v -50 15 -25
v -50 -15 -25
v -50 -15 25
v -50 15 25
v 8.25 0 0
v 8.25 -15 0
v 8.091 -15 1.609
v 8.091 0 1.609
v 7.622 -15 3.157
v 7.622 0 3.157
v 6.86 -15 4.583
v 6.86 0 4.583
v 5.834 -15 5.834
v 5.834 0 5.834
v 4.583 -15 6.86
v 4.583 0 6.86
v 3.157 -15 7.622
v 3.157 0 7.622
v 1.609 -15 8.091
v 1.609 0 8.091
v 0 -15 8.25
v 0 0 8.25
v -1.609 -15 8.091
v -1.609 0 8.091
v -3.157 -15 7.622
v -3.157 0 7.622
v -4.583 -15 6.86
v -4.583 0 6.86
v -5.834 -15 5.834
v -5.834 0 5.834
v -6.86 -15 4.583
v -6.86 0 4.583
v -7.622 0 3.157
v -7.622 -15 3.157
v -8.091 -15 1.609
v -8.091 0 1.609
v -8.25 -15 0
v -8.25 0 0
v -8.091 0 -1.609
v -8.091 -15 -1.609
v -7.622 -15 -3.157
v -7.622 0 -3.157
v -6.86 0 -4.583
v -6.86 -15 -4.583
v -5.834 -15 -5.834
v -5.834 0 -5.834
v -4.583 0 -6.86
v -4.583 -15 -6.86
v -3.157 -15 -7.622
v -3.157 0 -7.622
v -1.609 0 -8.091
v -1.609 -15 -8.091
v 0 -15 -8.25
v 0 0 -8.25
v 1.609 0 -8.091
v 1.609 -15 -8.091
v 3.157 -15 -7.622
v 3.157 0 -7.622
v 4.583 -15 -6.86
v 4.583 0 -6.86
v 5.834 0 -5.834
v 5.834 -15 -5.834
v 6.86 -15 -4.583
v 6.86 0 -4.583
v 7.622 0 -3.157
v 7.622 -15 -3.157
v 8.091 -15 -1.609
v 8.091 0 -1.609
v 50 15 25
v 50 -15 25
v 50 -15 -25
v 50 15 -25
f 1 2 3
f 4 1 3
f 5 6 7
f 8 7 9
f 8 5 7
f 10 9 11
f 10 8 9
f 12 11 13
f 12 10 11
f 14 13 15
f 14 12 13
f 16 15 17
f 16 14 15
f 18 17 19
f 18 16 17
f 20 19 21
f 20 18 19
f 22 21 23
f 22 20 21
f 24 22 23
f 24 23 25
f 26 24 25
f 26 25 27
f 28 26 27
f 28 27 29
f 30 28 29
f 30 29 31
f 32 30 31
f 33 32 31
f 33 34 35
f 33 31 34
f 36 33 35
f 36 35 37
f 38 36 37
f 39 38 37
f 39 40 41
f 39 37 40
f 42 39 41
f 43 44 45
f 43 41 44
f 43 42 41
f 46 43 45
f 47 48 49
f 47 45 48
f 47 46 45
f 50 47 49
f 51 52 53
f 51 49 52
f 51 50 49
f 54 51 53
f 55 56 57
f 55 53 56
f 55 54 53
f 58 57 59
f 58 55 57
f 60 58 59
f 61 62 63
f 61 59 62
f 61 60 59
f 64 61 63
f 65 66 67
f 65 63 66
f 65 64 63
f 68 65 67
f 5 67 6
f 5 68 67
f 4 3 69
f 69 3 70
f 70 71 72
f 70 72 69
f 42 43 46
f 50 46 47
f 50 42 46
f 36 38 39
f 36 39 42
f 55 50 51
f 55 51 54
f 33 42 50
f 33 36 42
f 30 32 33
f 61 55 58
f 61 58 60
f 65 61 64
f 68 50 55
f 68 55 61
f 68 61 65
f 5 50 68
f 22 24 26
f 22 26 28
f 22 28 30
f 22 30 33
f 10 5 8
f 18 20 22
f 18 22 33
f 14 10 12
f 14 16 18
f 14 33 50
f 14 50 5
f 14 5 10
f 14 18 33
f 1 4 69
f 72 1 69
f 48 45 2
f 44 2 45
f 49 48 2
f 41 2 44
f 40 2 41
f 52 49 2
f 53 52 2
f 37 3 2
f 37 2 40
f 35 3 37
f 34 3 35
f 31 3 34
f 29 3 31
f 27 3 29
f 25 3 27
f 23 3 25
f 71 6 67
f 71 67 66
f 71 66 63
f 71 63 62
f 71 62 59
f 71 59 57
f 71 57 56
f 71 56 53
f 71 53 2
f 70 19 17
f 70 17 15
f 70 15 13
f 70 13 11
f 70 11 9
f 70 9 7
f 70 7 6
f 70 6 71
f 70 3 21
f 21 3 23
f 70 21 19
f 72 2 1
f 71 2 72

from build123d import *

# Parameters (mm, degrees)
F0_W      = 100
F0_H      = 50
F1_DEPTH  = 15
F2_R      = 8.25
F1_FACE_W = 100
F1_FACE_H = 50
F3_DEPTH  = 20


with BuildPart() as f1:
    # F0 (on Front) → F1 (new body, symmetric)
    with BuildSketch(Plane.XZ):
        Rectangle(F0_W, F0_H)
    extrude(amount=F1_DEPTH, both=True)

    # F2 (on Front) + F1_face (on face) → F3 (cut)
    with BuildSketch(Plane.XZ):
        Circle(F2_R)
    with BuildSketch(Plane.XZ.offset(15)):
        Rectangle(F1_FACE_W, F1_FACE_H)
    extrude(amount=F3_DEPTH, mode=Mode.SUBTRACT)


solid = f1.part
